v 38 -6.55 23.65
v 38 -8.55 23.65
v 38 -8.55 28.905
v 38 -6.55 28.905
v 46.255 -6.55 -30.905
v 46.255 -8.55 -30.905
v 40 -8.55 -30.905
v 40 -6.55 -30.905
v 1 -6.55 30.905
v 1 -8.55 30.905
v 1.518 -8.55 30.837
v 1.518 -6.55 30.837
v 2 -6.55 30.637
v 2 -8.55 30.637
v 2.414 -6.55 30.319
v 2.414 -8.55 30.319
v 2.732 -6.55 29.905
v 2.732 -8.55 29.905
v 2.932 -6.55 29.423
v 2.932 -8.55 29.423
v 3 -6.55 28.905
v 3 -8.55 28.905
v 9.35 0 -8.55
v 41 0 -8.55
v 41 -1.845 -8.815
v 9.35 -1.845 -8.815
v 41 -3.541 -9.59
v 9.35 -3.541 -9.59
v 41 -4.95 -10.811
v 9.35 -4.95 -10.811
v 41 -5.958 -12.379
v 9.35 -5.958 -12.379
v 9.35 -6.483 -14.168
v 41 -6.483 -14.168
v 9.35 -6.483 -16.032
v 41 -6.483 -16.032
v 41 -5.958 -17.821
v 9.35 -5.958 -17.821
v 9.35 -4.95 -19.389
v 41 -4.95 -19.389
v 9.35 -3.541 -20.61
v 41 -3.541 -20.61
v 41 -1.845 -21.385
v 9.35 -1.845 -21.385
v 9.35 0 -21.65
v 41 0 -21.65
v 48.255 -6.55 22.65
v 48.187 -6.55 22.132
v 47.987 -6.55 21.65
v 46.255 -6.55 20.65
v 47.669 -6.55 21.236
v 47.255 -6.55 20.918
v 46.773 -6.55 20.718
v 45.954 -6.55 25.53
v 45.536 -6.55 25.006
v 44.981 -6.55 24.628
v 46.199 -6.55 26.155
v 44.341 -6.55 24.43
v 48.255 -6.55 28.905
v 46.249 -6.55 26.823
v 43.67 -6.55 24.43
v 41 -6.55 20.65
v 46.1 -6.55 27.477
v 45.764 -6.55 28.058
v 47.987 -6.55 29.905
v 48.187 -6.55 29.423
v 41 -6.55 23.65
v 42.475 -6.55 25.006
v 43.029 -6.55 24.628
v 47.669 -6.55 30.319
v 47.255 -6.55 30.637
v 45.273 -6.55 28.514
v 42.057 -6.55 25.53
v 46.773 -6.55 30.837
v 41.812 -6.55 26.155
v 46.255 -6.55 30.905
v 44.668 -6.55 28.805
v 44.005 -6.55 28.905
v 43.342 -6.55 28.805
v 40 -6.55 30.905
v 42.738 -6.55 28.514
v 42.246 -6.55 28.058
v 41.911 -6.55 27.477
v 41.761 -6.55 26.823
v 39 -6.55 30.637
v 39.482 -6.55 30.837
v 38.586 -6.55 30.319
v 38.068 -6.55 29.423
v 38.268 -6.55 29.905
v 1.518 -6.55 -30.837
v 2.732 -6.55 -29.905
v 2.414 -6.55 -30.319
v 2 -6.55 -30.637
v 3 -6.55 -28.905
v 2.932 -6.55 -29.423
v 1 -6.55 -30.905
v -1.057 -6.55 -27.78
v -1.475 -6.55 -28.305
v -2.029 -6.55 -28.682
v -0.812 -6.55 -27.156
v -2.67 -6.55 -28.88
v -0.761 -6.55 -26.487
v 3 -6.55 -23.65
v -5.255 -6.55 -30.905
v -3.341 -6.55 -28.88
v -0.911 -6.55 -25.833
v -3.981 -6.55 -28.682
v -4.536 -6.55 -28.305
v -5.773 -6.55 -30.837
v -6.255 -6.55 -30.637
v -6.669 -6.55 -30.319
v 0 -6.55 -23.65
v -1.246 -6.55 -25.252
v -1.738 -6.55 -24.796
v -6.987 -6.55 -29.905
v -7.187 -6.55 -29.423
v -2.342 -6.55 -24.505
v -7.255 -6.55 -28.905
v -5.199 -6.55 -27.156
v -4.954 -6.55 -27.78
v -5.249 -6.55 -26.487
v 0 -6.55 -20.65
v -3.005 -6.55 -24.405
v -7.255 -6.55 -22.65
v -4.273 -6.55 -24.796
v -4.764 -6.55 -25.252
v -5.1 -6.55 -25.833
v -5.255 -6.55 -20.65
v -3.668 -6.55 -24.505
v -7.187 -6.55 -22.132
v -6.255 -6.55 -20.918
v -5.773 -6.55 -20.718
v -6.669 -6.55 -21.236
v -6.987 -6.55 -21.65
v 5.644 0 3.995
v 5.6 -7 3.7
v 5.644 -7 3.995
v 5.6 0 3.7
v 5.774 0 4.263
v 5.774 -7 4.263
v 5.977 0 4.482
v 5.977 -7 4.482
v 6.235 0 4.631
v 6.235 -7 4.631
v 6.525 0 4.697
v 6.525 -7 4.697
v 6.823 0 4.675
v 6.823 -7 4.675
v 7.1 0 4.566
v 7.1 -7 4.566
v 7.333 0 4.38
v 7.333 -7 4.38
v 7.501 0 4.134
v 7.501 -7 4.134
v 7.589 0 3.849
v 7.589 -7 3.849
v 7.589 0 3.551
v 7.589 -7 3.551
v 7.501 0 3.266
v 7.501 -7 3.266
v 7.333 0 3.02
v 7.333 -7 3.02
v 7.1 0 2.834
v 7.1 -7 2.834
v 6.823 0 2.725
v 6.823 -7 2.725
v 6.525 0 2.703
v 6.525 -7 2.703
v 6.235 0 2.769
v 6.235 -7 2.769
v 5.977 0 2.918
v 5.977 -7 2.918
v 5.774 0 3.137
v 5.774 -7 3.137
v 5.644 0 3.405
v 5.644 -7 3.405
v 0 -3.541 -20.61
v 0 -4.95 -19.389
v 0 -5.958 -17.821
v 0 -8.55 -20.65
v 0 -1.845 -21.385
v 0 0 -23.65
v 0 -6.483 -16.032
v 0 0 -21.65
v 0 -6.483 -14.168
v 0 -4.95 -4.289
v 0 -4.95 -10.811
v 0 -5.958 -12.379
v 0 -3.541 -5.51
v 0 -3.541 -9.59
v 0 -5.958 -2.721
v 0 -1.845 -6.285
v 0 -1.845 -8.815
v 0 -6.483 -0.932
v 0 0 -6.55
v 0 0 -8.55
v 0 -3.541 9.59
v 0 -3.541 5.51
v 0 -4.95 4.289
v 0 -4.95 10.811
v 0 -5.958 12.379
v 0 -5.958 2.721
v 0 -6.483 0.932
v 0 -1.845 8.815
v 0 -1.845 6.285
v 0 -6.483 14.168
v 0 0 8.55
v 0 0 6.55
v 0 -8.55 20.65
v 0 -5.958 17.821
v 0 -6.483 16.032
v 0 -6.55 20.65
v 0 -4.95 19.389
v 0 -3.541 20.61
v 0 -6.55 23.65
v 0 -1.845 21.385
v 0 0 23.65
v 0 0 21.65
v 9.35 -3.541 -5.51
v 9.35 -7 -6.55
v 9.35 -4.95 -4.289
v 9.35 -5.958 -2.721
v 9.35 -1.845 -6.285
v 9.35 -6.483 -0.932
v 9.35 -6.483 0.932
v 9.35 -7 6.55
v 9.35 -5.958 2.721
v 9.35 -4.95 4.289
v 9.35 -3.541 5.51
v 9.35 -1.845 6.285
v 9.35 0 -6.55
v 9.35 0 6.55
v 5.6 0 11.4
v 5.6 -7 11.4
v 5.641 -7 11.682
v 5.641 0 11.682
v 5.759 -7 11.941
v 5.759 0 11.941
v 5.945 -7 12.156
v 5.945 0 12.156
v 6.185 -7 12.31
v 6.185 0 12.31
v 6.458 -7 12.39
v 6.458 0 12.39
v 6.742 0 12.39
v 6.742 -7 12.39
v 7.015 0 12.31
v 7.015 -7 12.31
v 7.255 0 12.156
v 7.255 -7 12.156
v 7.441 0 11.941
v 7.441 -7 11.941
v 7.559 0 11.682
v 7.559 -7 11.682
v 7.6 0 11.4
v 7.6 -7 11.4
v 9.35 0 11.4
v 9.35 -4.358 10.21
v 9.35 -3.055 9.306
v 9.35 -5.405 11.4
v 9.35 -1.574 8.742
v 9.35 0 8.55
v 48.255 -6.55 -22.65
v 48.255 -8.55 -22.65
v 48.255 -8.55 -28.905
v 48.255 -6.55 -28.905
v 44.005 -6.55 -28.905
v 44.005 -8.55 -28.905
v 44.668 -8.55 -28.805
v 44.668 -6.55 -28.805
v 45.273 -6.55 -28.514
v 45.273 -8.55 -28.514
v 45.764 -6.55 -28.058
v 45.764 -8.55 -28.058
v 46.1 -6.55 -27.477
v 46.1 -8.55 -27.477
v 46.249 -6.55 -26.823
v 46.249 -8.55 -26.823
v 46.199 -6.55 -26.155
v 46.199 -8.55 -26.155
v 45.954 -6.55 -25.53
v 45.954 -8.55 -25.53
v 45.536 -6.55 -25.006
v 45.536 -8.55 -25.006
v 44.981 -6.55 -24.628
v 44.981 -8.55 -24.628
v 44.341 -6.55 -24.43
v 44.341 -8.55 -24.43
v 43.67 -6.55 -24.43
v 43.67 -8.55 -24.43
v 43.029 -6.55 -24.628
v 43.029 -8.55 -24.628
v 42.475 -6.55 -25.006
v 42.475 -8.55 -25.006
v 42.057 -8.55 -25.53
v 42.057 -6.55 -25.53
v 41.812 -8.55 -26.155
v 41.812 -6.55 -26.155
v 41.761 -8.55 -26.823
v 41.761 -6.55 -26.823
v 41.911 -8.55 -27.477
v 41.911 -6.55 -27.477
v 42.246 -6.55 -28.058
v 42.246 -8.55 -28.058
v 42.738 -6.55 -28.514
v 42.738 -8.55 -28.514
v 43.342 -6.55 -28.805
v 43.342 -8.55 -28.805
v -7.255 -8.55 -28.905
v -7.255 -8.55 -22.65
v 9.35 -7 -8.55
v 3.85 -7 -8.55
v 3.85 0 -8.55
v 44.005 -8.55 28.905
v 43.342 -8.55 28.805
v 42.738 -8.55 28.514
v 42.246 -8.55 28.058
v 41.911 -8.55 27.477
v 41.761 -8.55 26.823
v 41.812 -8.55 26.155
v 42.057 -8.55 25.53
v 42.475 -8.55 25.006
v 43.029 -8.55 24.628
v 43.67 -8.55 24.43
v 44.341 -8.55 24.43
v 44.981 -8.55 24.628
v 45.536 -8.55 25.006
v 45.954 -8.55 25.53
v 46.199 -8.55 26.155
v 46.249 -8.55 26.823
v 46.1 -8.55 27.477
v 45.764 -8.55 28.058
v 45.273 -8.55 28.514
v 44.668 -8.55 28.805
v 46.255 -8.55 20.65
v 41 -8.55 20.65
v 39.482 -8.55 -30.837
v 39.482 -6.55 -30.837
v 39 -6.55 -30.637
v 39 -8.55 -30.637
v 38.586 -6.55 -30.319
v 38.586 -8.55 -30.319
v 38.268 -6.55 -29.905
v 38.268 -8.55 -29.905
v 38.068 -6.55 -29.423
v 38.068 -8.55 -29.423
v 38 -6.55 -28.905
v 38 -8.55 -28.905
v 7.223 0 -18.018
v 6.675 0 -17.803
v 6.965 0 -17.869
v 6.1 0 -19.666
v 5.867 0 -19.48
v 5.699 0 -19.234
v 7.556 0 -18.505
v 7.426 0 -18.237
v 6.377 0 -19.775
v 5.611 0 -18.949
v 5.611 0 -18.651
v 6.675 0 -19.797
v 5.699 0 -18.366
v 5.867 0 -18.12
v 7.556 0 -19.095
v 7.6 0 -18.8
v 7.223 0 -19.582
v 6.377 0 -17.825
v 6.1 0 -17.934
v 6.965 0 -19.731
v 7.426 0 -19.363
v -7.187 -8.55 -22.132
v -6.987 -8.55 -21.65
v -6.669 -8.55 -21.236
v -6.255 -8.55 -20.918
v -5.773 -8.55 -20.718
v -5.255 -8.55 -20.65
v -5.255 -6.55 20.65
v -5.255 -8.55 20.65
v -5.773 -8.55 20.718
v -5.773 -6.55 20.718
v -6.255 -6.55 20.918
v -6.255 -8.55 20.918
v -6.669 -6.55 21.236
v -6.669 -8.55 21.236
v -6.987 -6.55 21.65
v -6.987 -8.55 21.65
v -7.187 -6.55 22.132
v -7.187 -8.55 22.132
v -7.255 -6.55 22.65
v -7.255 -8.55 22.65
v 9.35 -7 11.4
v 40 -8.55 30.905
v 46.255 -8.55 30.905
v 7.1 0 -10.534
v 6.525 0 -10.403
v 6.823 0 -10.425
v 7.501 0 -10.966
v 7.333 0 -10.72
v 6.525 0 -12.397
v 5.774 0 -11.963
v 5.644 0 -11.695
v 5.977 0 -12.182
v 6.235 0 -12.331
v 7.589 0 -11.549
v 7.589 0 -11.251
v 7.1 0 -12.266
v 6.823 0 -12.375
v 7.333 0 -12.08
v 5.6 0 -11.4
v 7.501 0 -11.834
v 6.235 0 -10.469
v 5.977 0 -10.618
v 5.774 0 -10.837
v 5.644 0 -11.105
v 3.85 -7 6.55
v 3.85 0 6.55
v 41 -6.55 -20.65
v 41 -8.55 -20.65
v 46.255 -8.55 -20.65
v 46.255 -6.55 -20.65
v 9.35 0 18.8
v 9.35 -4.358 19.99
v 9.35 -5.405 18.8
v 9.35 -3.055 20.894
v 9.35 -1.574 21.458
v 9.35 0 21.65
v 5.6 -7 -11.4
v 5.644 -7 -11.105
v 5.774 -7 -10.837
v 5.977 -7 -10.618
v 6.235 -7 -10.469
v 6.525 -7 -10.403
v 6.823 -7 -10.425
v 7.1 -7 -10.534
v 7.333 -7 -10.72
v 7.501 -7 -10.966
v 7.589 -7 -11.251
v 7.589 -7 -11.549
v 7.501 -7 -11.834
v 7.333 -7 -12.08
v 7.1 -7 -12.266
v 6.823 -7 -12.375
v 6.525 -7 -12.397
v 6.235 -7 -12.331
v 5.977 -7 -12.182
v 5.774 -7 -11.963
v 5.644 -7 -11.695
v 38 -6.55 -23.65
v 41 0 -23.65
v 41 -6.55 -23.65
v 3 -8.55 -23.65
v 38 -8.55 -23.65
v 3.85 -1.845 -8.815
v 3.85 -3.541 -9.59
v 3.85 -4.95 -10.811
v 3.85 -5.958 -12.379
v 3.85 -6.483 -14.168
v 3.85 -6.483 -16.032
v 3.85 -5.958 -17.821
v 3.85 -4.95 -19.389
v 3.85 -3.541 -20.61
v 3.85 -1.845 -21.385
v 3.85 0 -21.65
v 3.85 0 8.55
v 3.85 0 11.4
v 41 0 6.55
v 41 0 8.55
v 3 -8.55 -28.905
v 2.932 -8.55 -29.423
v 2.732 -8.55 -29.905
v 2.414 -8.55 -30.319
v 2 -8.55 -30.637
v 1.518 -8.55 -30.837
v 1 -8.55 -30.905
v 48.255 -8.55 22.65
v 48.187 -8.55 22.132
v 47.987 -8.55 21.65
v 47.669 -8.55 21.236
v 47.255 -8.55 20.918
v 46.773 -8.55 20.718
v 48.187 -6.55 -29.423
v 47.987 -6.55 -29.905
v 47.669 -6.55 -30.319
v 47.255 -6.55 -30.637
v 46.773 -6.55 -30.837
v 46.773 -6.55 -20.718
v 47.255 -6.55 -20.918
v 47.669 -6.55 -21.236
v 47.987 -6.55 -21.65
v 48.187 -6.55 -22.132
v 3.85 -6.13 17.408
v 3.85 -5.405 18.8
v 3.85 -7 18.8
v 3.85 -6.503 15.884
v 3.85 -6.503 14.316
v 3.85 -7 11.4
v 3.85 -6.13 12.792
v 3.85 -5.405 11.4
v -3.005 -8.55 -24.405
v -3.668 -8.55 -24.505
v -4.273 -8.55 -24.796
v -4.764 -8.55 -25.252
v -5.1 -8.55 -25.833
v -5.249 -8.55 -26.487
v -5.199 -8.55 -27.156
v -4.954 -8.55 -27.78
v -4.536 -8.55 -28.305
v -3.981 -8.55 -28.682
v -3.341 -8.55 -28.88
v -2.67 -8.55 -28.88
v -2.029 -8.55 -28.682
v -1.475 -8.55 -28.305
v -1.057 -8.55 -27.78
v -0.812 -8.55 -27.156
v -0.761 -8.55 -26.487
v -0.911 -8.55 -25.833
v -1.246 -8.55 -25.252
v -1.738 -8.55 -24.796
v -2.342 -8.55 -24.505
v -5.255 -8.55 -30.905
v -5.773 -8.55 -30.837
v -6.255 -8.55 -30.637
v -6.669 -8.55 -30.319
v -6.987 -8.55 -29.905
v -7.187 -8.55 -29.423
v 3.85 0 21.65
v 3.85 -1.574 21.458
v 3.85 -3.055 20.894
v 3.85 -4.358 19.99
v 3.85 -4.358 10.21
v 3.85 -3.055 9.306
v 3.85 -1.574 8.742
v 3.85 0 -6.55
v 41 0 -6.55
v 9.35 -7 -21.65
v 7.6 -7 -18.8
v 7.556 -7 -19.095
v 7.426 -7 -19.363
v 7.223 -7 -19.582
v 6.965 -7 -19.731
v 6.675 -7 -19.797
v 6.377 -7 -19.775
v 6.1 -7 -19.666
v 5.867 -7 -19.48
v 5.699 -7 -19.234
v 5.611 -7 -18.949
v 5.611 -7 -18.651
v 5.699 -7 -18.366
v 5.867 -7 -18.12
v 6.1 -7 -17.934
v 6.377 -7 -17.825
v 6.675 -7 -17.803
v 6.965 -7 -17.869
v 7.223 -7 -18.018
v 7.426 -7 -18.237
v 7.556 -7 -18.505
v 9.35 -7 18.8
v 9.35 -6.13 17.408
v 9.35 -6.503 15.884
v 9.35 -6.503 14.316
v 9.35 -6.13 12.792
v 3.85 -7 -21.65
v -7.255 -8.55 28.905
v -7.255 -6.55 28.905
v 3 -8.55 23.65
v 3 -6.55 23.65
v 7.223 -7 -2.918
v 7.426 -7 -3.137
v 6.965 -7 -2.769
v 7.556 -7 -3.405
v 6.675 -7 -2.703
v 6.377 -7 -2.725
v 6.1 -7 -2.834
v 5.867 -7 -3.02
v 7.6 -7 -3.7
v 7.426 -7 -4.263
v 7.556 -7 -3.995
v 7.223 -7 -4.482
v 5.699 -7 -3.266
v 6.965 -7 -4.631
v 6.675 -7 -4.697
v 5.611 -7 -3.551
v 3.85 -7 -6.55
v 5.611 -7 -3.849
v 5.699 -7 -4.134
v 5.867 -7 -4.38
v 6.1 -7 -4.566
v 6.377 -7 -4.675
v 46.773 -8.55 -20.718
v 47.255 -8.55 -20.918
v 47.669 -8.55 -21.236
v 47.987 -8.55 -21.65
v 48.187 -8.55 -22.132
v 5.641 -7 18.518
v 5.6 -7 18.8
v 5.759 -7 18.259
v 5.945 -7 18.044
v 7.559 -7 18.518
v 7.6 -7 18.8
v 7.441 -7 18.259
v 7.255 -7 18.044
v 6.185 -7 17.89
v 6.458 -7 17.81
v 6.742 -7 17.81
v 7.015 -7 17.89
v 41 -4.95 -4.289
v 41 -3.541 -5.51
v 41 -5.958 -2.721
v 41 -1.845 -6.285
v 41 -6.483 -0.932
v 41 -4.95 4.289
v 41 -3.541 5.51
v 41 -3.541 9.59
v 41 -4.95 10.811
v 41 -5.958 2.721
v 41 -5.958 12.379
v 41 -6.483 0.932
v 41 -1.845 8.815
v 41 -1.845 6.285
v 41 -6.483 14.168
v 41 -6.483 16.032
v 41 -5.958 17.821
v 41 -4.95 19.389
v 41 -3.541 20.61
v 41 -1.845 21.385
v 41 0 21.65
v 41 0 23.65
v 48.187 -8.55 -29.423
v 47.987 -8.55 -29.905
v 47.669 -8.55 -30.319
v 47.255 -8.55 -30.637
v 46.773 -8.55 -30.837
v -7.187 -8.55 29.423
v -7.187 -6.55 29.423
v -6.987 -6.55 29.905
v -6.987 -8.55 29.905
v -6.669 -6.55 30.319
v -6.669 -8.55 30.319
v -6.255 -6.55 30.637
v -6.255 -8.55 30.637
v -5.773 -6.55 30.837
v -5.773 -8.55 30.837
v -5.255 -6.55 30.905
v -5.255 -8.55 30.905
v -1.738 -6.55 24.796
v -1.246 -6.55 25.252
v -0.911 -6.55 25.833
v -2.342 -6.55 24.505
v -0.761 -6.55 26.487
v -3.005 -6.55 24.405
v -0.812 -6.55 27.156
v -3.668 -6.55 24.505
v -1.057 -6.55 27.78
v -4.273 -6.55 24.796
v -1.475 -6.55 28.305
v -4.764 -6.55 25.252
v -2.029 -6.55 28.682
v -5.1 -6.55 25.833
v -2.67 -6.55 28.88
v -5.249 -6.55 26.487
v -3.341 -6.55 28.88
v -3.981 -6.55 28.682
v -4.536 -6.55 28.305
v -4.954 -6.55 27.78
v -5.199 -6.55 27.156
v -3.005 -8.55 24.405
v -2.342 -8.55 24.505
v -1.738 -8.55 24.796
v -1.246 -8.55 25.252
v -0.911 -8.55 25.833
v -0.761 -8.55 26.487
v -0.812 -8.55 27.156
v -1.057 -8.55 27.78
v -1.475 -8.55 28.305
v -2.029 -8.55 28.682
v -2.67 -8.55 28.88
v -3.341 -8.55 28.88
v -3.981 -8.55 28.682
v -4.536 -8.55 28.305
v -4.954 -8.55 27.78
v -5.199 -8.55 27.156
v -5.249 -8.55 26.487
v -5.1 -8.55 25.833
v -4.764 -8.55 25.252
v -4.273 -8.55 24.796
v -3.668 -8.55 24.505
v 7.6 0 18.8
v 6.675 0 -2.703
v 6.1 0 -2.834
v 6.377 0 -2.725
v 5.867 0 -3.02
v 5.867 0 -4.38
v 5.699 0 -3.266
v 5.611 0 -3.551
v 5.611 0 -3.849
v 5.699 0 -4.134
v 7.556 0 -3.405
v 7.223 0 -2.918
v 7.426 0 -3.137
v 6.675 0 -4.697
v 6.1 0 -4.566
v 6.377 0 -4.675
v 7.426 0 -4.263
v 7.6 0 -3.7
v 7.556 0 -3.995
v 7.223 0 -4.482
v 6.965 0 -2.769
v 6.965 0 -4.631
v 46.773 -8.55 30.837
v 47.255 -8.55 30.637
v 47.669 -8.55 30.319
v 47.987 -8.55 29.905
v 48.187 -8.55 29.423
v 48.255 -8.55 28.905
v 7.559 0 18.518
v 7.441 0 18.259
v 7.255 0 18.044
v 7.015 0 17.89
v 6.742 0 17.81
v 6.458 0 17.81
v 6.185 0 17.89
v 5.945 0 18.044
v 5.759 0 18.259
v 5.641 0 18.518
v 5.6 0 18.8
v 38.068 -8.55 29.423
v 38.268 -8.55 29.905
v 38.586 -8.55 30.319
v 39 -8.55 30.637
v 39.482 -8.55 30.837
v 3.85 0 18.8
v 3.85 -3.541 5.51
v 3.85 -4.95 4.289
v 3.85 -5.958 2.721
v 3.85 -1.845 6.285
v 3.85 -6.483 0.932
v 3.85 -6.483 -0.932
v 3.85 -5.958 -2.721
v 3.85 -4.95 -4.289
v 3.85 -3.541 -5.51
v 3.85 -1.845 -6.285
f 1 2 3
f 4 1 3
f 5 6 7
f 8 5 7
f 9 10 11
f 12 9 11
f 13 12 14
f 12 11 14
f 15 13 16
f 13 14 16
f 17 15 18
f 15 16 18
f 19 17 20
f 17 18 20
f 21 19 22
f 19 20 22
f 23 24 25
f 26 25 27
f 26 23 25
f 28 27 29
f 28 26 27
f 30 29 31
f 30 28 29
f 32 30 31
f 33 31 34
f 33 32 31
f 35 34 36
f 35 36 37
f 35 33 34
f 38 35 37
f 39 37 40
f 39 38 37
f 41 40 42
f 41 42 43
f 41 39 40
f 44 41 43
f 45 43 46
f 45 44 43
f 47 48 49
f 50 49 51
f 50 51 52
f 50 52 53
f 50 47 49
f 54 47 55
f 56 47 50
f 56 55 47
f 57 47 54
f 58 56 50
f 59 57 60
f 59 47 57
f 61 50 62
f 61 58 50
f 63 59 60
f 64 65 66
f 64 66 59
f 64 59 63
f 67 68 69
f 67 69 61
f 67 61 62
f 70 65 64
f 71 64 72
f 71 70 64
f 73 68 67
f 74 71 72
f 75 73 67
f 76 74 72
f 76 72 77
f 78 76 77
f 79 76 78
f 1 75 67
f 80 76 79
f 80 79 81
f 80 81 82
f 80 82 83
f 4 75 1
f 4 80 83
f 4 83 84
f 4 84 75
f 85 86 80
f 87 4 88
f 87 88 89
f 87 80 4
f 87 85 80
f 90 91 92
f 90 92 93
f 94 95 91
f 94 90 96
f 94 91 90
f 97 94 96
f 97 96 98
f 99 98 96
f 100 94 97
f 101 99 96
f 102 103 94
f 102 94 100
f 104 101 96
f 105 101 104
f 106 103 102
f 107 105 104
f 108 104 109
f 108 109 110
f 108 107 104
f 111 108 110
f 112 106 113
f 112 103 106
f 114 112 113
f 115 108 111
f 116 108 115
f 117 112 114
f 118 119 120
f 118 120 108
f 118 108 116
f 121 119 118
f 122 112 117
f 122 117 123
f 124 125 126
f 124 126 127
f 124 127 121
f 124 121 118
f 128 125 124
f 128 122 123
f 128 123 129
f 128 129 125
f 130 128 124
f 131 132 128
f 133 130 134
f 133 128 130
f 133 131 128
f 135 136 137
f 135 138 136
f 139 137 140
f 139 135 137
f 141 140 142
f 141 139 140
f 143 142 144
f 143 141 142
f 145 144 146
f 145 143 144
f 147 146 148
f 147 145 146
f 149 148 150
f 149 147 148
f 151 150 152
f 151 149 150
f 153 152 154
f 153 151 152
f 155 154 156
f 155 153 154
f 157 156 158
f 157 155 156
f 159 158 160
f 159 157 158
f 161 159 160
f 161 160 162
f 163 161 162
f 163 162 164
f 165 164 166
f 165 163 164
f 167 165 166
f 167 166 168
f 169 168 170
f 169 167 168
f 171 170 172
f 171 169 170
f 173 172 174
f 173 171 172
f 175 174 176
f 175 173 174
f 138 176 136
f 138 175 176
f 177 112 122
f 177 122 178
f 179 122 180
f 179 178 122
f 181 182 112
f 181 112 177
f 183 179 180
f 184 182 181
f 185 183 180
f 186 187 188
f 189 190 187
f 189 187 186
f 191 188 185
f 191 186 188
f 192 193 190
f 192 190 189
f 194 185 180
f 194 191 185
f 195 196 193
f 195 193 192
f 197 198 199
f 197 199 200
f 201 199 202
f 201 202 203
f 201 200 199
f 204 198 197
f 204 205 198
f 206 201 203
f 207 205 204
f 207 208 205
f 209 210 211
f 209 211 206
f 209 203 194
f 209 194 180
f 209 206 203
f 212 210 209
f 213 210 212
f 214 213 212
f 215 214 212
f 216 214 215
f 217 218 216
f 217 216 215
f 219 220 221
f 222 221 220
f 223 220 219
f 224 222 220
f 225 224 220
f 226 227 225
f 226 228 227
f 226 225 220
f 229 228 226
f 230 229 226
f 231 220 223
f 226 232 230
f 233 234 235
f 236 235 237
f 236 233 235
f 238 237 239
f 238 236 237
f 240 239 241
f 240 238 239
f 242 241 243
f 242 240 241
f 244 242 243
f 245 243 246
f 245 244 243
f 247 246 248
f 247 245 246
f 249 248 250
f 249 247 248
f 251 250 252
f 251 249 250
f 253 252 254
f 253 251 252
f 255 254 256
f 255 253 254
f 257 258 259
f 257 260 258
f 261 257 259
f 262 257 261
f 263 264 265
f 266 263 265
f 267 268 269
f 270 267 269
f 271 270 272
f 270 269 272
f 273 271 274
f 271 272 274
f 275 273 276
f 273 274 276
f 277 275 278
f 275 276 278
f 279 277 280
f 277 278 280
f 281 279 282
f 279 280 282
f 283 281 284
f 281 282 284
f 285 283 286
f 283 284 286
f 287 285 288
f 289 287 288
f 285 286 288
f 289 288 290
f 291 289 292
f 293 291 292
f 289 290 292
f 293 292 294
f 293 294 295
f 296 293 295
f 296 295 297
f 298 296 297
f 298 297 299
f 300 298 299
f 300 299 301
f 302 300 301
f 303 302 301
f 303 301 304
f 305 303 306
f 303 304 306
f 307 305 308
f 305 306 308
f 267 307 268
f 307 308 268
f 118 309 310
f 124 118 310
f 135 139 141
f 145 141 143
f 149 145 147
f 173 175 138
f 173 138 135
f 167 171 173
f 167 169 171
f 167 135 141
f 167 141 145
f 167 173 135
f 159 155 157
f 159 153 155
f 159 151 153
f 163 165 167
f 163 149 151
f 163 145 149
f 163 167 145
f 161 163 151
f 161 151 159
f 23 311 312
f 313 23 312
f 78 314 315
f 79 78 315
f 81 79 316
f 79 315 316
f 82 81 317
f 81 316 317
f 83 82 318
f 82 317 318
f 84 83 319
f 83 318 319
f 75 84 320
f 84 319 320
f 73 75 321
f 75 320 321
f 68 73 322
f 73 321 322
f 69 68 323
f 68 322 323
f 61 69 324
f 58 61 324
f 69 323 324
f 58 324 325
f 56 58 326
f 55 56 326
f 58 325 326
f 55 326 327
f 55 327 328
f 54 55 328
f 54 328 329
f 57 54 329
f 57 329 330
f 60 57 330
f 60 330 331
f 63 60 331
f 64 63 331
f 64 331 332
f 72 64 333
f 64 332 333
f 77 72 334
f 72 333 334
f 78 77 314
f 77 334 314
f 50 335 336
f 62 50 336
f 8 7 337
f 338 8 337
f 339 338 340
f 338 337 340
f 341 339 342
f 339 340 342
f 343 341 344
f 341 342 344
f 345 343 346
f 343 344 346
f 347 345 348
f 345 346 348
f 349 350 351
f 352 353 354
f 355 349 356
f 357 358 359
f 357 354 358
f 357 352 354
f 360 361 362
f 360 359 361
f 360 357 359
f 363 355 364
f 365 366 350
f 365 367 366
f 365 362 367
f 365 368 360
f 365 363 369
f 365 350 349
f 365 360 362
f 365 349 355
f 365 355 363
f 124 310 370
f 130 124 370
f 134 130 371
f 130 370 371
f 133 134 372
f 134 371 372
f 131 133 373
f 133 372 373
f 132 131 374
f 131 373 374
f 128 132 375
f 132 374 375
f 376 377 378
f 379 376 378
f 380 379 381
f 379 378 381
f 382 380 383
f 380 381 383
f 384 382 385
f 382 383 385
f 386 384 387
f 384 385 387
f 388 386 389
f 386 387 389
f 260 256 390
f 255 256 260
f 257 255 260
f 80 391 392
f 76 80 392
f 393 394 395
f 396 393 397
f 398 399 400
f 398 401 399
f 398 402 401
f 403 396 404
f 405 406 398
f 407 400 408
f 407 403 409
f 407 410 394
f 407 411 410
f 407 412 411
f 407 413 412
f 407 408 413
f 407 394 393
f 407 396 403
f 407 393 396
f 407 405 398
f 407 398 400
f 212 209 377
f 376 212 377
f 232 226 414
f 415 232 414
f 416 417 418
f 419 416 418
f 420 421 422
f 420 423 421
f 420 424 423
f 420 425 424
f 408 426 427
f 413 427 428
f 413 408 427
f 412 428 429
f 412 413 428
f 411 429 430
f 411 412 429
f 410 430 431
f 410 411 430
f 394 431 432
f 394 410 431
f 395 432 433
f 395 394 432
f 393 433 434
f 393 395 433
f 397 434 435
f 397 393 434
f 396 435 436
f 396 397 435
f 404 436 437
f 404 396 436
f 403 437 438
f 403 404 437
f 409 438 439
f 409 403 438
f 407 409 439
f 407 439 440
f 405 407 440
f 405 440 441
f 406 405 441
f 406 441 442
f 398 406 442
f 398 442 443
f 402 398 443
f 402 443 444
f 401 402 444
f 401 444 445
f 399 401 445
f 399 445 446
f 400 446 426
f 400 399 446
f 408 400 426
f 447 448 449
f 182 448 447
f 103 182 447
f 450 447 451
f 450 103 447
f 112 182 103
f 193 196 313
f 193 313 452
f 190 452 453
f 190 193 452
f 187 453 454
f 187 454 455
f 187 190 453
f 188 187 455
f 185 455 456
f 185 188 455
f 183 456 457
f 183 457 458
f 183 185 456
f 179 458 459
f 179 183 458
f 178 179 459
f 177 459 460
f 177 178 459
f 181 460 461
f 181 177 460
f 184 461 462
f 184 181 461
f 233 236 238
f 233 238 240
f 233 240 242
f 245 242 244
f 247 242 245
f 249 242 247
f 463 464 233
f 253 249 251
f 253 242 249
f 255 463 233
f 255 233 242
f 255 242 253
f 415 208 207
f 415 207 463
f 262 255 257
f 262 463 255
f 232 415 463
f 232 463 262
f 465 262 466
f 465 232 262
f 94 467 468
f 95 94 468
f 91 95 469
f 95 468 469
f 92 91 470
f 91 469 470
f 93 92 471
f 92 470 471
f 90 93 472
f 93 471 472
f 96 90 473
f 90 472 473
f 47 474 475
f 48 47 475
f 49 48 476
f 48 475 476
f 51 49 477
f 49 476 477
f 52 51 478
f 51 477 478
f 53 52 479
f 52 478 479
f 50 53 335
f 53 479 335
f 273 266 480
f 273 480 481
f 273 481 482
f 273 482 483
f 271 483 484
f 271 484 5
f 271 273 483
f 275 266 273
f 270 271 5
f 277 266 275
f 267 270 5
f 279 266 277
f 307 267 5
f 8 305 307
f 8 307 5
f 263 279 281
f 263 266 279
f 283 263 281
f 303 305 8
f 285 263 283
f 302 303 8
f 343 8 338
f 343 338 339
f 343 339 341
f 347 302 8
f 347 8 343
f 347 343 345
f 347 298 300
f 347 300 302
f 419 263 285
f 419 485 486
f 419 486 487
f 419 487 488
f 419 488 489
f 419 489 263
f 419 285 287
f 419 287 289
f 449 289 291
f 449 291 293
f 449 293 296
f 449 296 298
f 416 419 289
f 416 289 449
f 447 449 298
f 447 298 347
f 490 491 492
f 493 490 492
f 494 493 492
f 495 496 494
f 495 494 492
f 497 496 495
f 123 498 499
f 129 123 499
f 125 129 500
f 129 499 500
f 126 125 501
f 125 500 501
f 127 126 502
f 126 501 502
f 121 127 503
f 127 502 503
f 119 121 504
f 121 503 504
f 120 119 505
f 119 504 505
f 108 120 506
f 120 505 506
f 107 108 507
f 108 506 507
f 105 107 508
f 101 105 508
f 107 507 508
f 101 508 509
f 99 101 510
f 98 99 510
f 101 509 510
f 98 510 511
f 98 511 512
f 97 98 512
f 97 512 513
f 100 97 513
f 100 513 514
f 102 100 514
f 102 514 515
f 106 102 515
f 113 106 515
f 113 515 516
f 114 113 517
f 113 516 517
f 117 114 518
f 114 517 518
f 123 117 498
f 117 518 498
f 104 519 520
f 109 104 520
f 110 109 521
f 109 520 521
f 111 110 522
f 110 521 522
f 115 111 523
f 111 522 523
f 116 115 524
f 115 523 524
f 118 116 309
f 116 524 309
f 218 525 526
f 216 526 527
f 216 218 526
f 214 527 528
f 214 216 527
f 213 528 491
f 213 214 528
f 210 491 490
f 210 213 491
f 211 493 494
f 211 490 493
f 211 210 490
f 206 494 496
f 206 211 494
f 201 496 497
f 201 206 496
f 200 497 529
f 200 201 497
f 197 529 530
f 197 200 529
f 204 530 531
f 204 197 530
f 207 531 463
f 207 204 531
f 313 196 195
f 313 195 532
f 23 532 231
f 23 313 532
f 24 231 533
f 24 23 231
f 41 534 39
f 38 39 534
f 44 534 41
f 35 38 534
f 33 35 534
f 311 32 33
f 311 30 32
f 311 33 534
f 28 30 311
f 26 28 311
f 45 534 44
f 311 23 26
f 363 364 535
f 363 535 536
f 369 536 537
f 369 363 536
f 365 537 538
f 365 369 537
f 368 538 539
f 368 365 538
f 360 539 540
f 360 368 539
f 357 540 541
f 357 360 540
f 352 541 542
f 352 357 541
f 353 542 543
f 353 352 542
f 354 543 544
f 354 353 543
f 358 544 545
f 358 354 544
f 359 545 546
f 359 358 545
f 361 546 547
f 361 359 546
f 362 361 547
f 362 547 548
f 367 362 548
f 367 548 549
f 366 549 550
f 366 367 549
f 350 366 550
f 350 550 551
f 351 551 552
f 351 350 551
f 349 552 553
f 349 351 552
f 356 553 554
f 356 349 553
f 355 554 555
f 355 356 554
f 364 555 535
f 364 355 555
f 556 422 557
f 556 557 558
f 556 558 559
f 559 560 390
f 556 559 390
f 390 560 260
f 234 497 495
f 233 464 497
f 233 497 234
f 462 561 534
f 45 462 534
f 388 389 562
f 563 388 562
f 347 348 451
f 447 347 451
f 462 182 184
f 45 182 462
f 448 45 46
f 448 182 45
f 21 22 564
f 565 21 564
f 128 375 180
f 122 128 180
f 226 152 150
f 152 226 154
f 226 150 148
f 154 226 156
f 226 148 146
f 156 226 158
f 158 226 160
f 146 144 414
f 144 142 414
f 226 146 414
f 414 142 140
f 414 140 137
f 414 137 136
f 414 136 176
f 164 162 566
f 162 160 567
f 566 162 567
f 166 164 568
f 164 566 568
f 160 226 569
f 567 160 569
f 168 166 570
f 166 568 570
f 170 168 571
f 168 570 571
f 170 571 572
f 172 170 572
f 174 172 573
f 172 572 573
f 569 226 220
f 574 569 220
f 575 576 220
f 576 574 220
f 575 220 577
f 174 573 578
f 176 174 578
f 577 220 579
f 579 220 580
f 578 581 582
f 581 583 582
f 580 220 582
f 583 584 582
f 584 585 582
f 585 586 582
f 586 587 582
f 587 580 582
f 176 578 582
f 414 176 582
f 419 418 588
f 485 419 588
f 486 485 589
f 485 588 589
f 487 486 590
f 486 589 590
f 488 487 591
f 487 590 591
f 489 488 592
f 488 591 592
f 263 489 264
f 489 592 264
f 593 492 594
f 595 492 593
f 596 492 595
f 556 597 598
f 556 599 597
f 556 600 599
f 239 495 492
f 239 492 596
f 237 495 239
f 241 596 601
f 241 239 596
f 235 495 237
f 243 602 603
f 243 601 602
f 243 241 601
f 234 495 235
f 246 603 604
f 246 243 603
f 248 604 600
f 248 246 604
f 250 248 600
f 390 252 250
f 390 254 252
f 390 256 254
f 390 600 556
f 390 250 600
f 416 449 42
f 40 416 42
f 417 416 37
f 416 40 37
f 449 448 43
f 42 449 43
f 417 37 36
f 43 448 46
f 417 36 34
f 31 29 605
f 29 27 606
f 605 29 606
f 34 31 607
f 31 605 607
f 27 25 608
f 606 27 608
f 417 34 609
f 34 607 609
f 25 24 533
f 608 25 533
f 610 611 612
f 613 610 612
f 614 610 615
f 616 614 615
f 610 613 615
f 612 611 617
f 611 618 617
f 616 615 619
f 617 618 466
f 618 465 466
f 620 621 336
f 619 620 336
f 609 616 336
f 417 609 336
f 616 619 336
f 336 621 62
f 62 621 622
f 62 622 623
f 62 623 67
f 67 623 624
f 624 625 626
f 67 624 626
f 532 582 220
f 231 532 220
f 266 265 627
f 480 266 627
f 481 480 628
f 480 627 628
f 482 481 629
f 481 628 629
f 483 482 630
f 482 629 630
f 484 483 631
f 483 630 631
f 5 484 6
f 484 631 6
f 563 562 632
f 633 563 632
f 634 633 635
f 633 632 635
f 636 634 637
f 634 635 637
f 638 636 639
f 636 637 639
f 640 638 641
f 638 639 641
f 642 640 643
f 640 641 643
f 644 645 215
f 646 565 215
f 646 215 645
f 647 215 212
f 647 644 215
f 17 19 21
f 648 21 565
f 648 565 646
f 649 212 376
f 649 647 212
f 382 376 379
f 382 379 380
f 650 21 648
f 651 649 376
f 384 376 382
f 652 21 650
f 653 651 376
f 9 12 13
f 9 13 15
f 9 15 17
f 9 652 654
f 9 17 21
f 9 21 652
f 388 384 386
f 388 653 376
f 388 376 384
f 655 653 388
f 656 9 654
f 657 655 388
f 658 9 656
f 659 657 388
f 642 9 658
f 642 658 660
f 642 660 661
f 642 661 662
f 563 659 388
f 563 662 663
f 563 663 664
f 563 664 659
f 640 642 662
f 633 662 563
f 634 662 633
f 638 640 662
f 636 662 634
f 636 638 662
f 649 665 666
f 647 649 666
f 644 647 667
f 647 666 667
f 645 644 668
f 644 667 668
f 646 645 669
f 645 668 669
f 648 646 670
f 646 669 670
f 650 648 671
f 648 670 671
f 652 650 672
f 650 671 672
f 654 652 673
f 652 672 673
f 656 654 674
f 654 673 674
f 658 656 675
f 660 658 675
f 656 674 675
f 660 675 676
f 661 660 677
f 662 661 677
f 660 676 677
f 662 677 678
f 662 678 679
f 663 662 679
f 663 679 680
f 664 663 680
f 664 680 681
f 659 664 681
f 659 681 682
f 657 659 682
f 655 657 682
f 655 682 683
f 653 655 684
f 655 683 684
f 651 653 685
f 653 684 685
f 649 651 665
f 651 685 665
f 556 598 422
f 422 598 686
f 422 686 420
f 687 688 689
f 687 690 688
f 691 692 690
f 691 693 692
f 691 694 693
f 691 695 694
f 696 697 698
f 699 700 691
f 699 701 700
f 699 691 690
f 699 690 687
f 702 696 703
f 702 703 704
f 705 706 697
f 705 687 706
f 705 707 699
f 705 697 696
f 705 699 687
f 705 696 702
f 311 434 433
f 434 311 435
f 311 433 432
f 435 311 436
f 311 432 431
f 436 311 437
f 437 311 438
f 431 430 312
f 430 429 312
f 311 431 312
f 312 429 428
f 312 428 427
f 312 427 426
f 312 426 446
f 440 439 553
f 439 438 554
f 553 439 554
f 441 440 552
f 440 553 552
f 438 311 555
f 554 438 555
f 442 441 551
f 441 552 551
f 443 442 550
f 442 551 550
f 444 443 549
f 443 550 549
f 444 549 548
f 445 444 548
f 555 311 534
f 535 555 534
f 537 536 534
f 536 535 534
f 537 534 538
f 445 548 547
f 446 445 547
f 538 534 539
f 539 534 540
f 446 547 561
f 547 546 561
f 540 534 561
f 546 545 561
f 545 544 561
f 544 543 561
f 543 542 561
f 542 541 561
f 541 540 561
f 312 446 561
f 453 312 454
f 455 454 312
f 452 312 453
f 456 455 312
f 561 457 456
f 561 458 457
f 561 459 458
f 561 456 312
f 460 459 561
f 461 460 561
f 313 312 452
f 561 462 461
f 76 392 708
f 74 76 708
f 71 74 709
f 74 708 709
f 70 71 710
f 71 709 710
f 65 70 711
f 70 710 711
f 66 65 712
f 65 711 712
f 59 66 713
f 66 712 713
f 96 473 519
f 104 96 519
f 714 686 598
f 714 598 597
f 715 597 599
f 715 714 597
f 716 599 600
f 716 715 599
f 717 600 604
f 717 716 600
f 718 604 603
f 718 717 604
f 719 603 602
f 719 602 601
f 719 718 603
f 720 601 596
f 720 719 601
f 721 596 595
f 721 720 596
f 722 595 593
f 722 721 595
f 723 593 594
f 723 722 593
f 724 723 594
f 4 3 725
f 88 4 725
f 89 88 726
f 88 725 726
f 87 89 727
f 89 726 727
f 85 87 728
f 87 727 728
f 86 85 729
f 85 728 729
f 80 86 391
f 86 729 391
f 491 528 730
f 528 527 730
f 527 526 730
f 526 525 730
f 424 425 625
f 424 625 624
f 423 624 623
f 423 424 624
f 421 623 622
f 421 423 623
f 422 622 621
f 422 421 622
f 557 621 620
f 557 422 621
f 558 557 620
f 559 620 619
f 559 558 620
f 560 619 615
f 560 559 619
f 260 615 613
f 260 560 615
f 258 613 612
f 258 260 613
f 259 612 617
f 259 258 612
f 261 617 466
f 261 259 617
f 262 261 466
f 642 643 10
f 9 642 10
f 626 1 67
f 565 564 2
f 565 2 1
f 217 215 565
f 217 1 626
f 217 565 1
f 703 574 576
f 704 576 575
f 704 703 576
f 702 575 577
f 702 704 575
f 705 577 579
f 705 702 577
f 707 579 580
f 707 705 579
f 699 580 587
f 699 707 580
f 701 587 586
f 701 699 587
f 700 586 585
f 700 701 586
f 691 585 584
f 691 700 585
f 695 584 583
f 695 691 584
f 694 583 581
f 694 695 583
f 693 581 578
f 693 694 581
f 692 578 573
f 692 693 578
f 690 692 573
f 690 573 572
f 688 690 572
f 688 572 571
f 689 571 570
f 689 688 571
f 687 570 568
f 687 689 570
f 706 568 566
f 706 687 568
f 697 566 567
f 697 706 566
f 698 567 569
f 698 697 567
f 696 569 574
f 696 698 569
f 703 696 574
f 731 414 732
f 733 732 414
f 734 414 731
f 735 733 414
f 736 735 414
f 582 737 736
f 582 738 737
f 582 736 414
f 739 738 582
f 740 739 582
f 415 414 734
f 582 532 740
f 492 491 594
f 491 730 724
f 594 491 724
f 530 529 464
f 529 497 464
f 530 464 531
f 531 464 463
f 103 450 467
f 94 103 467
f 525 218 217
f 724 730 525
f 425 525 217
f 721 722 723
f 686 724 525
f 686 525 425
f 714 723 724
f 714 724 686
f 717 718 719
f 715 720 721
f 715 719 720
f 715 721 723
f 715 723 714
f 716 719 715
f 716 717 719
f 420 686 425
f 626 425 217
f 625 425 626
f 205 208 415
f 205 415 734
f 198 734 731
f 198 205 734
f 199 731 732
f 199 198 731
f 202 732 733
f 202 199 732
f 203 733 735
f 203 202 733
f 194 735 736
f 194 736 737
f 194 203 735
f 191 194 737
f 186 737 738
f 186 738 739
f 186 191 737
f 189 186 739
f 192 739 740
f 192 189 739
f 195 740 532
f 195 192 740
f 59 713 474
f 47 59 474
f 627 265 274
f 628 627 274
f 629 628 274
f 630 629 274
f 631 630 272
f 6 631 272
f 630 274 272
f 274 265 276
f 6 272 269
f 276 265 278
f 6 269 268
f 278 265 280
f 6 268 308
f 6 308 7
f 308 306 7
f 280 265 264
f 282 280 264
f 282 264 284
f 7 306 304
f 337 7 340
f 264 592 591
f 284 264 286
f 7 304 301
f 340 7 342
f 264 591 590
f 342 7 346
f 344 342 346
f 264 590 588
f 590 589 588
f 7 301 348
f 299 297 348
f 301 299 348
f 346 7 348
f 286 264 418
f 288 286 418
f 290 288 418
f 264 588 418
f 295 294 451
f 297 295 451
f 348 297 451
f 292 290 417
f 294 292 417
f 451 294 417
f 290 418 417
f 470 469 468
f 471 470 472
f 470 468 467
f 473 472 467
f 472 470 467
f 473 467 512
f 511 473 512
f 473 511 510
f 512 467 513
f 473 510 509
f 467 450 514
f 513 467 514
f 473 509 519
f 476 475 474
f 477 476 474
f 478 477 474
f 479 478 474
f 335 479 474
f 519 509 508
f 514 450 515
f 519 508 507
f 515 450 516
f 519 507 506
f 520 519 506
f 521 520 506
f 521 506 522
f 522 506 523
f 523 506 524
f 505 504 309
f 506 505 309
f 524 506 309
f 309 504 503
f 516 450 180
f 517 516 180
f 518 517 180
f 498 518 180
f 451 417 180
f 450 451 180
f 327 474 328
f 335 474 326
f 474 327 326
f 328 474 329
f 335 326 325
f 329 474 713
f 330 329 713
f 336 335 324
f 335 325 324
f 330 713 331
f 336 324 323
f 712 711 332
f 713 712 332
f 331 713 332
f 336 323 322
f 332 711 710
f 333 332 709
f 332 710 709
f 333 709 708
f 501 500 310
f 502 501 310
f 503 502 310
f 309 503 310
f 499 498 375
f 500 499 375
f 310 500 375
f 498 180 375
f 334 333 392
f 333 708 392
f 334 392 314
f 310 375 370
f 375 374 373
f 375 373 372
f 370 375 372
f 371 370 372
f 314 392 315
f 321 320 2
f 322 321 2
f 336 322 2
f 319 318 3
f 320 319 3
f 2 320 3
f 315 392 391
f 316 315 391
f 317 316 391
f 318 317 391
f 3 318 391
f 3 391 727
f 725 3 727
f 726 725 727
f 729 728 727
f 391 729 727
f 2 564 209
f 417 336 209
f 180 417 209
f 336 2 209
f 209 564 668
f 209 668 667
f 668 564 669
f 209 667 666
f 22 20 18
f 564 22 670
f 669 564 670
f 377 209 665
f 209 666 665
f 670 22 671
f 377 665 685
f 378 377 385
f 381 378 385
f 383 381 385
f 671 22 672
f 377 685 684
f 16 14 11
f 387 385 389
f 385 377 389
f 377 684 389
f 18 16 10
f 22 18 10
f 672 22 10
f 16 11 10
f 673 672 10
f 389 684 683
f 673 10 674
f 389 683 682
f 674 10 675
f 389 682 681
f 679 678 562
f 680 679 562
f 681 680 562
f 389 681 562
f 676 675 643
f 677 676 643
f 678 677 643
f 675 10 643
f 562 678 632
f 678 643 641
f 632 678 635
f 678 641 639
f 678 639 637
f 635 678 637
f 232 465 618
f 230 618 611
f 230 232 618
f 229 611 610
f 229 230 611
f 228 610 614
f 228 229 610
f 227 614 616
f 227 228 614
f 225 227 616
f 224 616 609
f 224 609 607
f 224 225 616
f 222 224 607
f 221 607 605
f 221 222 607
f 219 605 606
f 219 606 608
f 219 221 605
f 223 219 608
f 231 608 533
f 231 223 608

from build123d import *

# Parameters (mm, degrees)
BOSS_EXTRUDE1_DEPTH = 41
BOSS_EXTRUDE2_REACH = 50.098
SKETCH2_R           = 1
SKETCH4_W           = 5.5
SKETCH4_H           = 13.1
SKETCH4_R           = 1
CUT_EXTRUDE1_DEPTH  = 7
SKETCH5_R           = 2.25
BOSS_EXTRUDE3_DEPTH = 2
BOSS_EXTRUDE4_REACH = 59.938
SKETCH6_W           = 5.5
SKETCH6_H           = 2.85
CUT_EXTRUDE2_DEPTH  = 7


with BuildPart() as part:
    # Sketch1 → Boss-Extrude1 (new body)
    with BuildSketch(Plane(origin=(0, 0, 0), x_dir=(0, 0, -1), z_dir=(1, 0, 0))):
        with BuildLine():
            Line((-8.55, 0), (-6.55, 0))
            ThreePointArc((-6.55, 0), (0, -6.55), (6.55, 0))
            Line((6.55, 0), (8.55, 0))
            ThreePointArc((8.55, 0), (15.1, -6.55), (21.65, 0))
            Line((21.65, 0), (23.65, 0))
            Line((23.65, 0), (23.65, -8.55))
            Line((23.65, -8.55), (-23.65, -8.55))
            Line((-23.65, -8.55), (-23.65, 0))
            Line((-23.65, 0), (-21.65, 0))
            ThreePointArc((-21.65, 0), (-15.1, -6.55), (-8.55, 0))
        make_face()
    extrude(amount=BOSS_EXTRUDE1_DEPTH)

    # Sketch2 → Boss-Extrude2 (add, up to next)
    with BuildSketch(Plane(origin=(0, 0, 0), x_dir=(1, 0, 0), z_dir=(0, 1, 0)), mode=Mode.PRIVATE) as boss_extrude2_sk1:
        with Locations(Location((6.6, 3.7, 0), (0, 0, 270))):
            Circle(SKETCH2_R)
    boss_extrude2_tool1 = extrude(boss_extrude2_sk1.sketch, amount=-BOSS_EXTRUDE2_REACH, mode=Mode.PRIVATE) - part.part
    # Sketch2 → Boss-Extrude2 (add, up to next)
    with BuildSketch(Plane(origin=(0, 0, 0), x_dir=(1, 0, 0), z_dir=(0, 1, 0)), mode=Mode.PRIVATE) as boss_extrude2_sk2:
        with Locations(Location((6.6, -3.7, 0), (0, 0, 270))):
            Circle(SKETCH2_R)
    boss_extrude2_tool2 = extrude(boss_extrude2_sk2.sketch, amount=-BOSS_EXTRUDE2_REACH, mode=Mode.PRIVATE) - part.part
    # Sketch2 → Boss-Extrude2 (add, up to next)
    with BuildSketch(Plane(origin=(0, 0, 0), x_dir=(1, 0, 0), z_dir=(0, 1, 0)), mode=Mode.PRIVATE) as boss_extrude2_sk3:
        with Locations(Location((6.6, -11.4, 0), (0, 0, 270))):
            Circle(SKETCH2_R)
    boss_extrude2_tool3 = extrude(boss_extrude2_sk3.sketch, amount=-BOSS_EXTRUDE2_REACH, mode=Mode.PRIVATE) - part.part
    # Sketch2 → Boss-Extrude2 (add, up to next)
    with BuildSketch(Plane(origin=(0, 0, 0), x_dir=(1, 0, 0), z_dir=(0, 1, 0)), mode=Mode.PRIVATE) as boss_extrude2_sk4:
        with Locations(Location((6.6, -18.8, 0), (0, 0, 270))):
            Circle(SKETCH2_R)
    boss_extrude2_tool4 = extrude(boss_extrude2_sk4.sketch, amount=-BOSS_EXTRUDE2_REACH, mode=Mode.PRIVATE) - part.part
    # Sketch2 → Boss-Extrude2 (add, up to next)
    with BuildSketch(Plane(origin=(0, 0, 0), x_dir=(1, 0, 0), z_dir=(0, 1, 0)), mode=Mode.PRIVATE) as boss_extrude2_sk5:
        with Locations(Location((6.6, 18.8, 0), (0, 0, 270))):
            Circle(SKETCH2_R)
    boss_extrude2_tool5 = extrude(boss_extrude2_sk5.sketch, amount=-BOSS_EXTRUDE2_REACH, mode=Mode.PRIVATE) - part.part
    # Sketch2 → Boss-Extrude2 (add, up to next)
    with BuildSketch(Plane(origin=(0, 0, 0), x_dir=(1, 0, 0), z_dir=(0, 1, 0)), mode=Mode.PRIVATE) as boss_extrude2_sk6:
        with Locations(Location((6.6, 11.4, 0), (0, 0, 270))):
            Circle(SKETCH2_R)
    boss_extrude2_tool6 = extrude(boss_extrude2_sk6.sketch, amount=-BOSS_EXTRUDE2_REACH, mode=Mode.PRIVATE) - part.part
    add(boss_extrude2_tool1.solids().sort_by_distance((6.6, 0, -3.7))[0])
    add(boss_extrude2_tool2.solids().sort_by_distance((6.6, 0, 3.7))[0])
    add(boss_extrude2_tool3.solids().sort_by_distance((6.6, 0, 11.4))[0])
    add(boss_extrude2_tool4.solids().sort_by_distance((6.6, 0, 18.8))[0])
    add(boss_extrude2_tool5.solids().sort_by_distance((6.6, 0, -18.8))[0])
    add(boss_extrude2_tool6.solids().sort_by_distance((6.6, 0, -11.4))[0])

    # Sketch4 → Cut-Extrude1 (cut)
    # profile 1 of 3: a face of its own
    with BuildSketch(Plane(origin=(0, 0, 0), x_dir=(1, 0, 0), z_dir=(0, 1, 0))):
        with Locations((6.6, 0)):
            Rectangle(SKETCH4_W, SKETCH4_H)
        with Locations(Location((6.6, 3.7, 0), (0, 0, 270))):
            Circle(SKETCH4_R, mode=Mode.SUBTRACT)
        with Locations(Location((6.6, -3.7, 0), (0, 0, 270))):
            Circle(SKETCH4_R, mode=Mode.SUBTRACT)
    # profile 2 of 3: a face of its own
    with BuildSketch(Plane(origin=(0, 0, 0), x_dir=(1, 0, 0), z_dir=(0, 1, 0))):
        with Locations((6.6, -15.1)):
            Rectangle(SKETCH4_W, SKETCH4_H)
        with Locations(Location((6.6, -11.4, 0), (0, 0, 90))):
            Circle(SKETCH4_R, mode=Mode.SUBTRACT)
        with Locations(Location((6.6, -18.8, 0), (0, 0, 90))):
            Circle(SKETCH4_R, mode=Mode.SUBTRACT)
    # profile 3 of 3: a face of its own
    with BuildSketch(Plane(origin=(0, 0, 0), x_dir=(1, 0, 0), z_dir=(0, 1, 0))):
        with Locations((6.6, 15.1)):
            Rectangle(SKETCH4_W, SKETCH4_H)
        with Locations(Location((6.6, 11.4, 0), (0, 0, 90))):
            Circle(SKETCH4_R, mode=Mode.SUBTRACT)
        with Locations(Location((6.6, 18.8, 0), (0, 0, 90))):
            Circle(SKETCH4_R, mode=Mode.SUBTRACT)
    extrude(amount=-CUT_EXTRUDE1_DEPTH, mode=Mode.SUBTRACT)

    # Sketch5 → Boss-Extrude3 (add)
    # profile 1 of 4: a face of its own
    with BuildSketch(Plane.XZ.offset(8.55)):
        with BuildLine():
            Line((0, 23.65), (0, 20.65))
            Line((0, 20.65), (-5.25520382, 20.65))
            ThreePointArc((-5.25520382, 20.65), (-6.669417382, 21.235786438), (-7.25520382, 22.65))
            Line((-7.25520382, 22.65), (-7.25520382, 28.90520382))
            ThreePointArc((-7.25520382, 28.90520382), (-6.669417382, 30.319417382), (-5.25520382, 30.90520382))
            Line((-5.25520382, 30.90520382), (1, 30.90520382))
            ThreePointArc((1, 30.90520382), (2.414213562, 30.319417382), (3, 28.90520382))
            Line((3, 28.90520382), (3, 23.65))
            Line((3, 23.65), (0, 23.65))
        make_face()
        with Locations(Location((-3.00520382, 26.65520382, 0), (0, 0, 270))):
            Circle(SKETCH5_R, mode=Mode.SUBTRACT)
    # profile 2 of 4: a face of its own
    with BuildSketch(Plane.XZ.offset(8.55)):
        with BuildLine():
            Line((0, -23.65), (3, -23.65))
            Line((3, -23.65), (3, -28.90520382))
            ThreePointArc((3, -28.90520382), (2.414213562, -30.319417382), (1, -30.90520382))
            Line((1, -30.90520382), (-5.25520382, -30.90520382))
            ThreePointArc((-5.25520382, -30.90520382), (-6.669417382, -30.319417382), (-7.25520382, -28.90520382))
            Line((-7.25520382, -28.90520382), (-7.25520382, -22.65))
            ThreePointArc((-7.25520382, -22.65), (-6.669417382, -21.235786438), (-5.25520382, -20.65))
            Line((-5.25520382, -20.65), (0, -20.65))
            Line((0, -20.65), (0, -23.65))
        make_face()
        with Locations(Location((-3.00520382, -26.65520382, 0), (0, 0, 90))):
            Circle(SKETCH5_R, mode=Mode.SUBTRACT)
    # profile 3 of 4: a face of its own
    with BuildSketch(Plane.XZ.offset(8.55)):
        with BuildLine():
            Line((41, -23.65), (41, -20.65))
            Line((41, -20.65), (46.25520382, -20.65))
            ThreePointArc((46.25520382, -20.65), (47.669417382, -21.235786438), (48.25520382, -22.65))
            Line((48.25520382, -22.65), (48.25520382, -28.90520382))
            ThreePointArc((48.25520382, -28.90520382), (47.669417382, -30.319417382), (46.25520382, -30.90520382))
            Line((46.25520382, -30.90520382), (40, -30.90520382))
            ThreePointArc((40, -30.90520382), (38.585786438, -30.319417382), (38, -28.90520382))
            Line((38, -28.90520382), (38, -23.65))
            Line((38, -23.65), (41, -23.65))
        make_face()
        with Locations(Location((44.00520382, -26.65520382, 0), (0, 0, 270))):
            Circle(SKETCH5_R, mode=Mode.SUBTRACT)
    # profile 4 of 4: a face of its own
    with BuildSketch(Plane.XZ.offset(8.55)):
        with BuildLine():
            Line((41, 23.65), (38, 23.65))
            Line((38, 23.65), (38, 28.90520382))
            ThreePointArc((38, 28.90520382), (38.585786438, 30.319417382), (40, 30.90520382))
            Line((40, 30.90520382), (46.25520382, 30.90520382))
            ThreePointArc((46.25520382, 30.90520382), (47.669417382, 30.319417382), (48.25520382, 28.90520382))
            Line((48.25520382, 28.90520382), (48.25520382, 22.65))
            ThreePointArc((48.25520382, 22.65), (47.669417382, 21.235786438), (46.25520382, 20.65))
            Line((46.25520382, 20.65), (41, 20.65))
            Line((41, 20.65), (41, 23.65))
        make_face()
        with Locations(Location((44.00520382, 26.65520382, 0), (0, 0, 90))):
            Circle(SKETCH5_R, mode=Mode.SUBTRACT)
    extrude(amount=-BOSS_EXTRUDE3_DEPTH)

    # Boss-Extrude4: up to this face of the body (flat: up to its plane)
    boss_extrude4_end = Plane(part.part.faces().sort_by_distance((6.6, -7, -15.1))[0])
    # Sketch6 → Boss-Extrude4 (add, up to the picked face)
    with BuildSketch(Plane(origin=(0, 0, 0), x_dir=(1, 0, 0), z_dir=(0, 1, 0)), mode=Mode.PRIVATE) as boss_extrude4_sk1:
        with Locations((6.6, -5.125)):
            Rectangle(SKETCH6_W, SKETCH6_H)
    boss_extrude4_tool1 = split(extrude(boss_extrude4_sk1.sketch, amount=-BOSS_EXTRUDE4_REACH, mode=Mode.PRIVATE), bisect_by=boss_extrude4_end, keep=Keep.BOTH, mode=Mode.PRIVATE)
    # Sketch6 → Boss-Extrude4 (add, up to the picked face)
    with BuildSketch(Plane(origin=(0, 0, 0), x_dir=(1, 0, 0), z_dir=(0, 1, 0)), mode=Mode.PRIVATE) as boss_extrude4_sk2:
        with Locations((6.6, 5.125)):
            Rectangle(SKETCH6_W, SKETCH6_H)
    boss_extrude4_tool2 = split(extrude(boss_extrude4_sk2.sketch, amount=-BOSS_EXTRUDE4_REACH, mode=Mode.PRIVATE), bisect_by=boss_extrude4_end, keep=Keep.BOTH, mode=Mode.PRIVATE)
    # Sketch6 → Boss-Extrude4 (add, up to the picked face)
    with BuildSketch(Plane(origin=(0, 0, 0), x_dir=(1, 0, 0), z_dir=(0, 1, 0)), mode=Mode.PRIVATE) as boss_extrude4_sk3:
        with Locations((6.6, -20.225)):
            Rectangle(SKETCH6_W, SKETCH6_H)
    boss_extrude4_tool3 = split(extrude(boss_extrude4_sk3.sketch, amount=-BOSS_EXTRUDE4_REACH, mode=Mode.PRIVATE), bisect_by=boss_extrude4_end, keep=Keep.BOTH, mode=Mode.PRIVATE)
    # Sketch6 → Boss-Extrude4 (add, up to the picked face)
    with BuildSketch(Plane(origin=(0, 0, 0), x_dir=(1, 0, 0), z_dir=(0, 1, 0)), mode=Mode.PRIVATE) as boss_extrude4_sk4:
        with Locations((6.6, -9.975)):
            Rectangle(SKETCH6_W, SKETCH6_H)
    boss_extrude4_tool4 = split(extrude(boss_extrude4_sk4.sketch, amount=-BOSS_EXTRUDE4_REACH, mode=Mode.PRIVATE), bisect_by=boss_extrude4_end, keep=Keep.BOTH, mode=Mode.PRIVATE)
    # Sketch6 → Boss-Extrude4 (add, up to the picked face)
    with BuildSketch(Plane(origin=(0, 0, 0), x_dir=(1, 0, 0), z_dir=(0, 1, 0)), mode=Mode.PRIVATE) as boss_extrude4_sk5:
        with Locations((6.6, 9.975)):
            Rectangle(SKETCH6_W, SKETCH6_H)
    boss_extrude4_tool5 = split(extrude(boss_extrude4_sk5.sketch, amount=-BOSS_EXTRUDE4_REACH, mode=Mode.PRIVATE), bisect_by=boss_extrude4_end, keep=Keep.BOTH, mode=Mode.PRIVATE)
    # Sketch6 → Boss-Extrude4 (add, up to the picked face)
    with BuildSketch(Plane(origin=(0, 0, 0), x_dir=(1, 0, 0), z_dir=(0, 1, 0)), mode=Mode.PRIVATE) as boss_extrude4_sk6:
        with Locations((6.6, 20.225)):
            Rectangle(SKETCH6_W, SKETCH6_H)
    boss_extrude4_tool6 = split(extrude(boss_extrude4_sk6.sketch, amount=-BOSS_EXTRUDE4_REACH, mode=Mode.PRIVATE), bisect_by=boss_extrude4_end, keep=Keep.BOTH, mode=Mode.PRIVATE)
    add(boss_extrude4_tool1.solids().sort_by(Axis((6.6, 0, 5.125), (0, -1, 0)))[0])
    add(boss_extrude4_tool2.solids().sort_by(Axis((6.6, 0, -5.125), (0, -1, 0)))[0])
    add(boss_extrude4_tool3.solids().sort_by(Axis((6.6, 0, 20.225), (0, -1, 0)))[0])
    add(boss_extrude4_tool4.solids().sort_by(Axis((6.6, 0, 9.975), (0, -1, 0)))[0])
    add(boss_extrude4_tool5.solids().sort_by(Axis((6.6, 0, -9.975), (0, -1, 0)))[0])
    add(boss_extrude4_tool6.solids().sort_by(Axis((6.6, 0, -20.225), (0, -1, 0)))[0])

    # Sketch7 → Cut-Extrude2 (cut)
    with BuildSketch(Plane(origin=(0, 0, 0), x_dir=(1, 0, 0), z_dir=(0, 1, 0))):
        with BuildLine():
            Line((5.6, 3.7), (3.85, 3.7))
            Line((3.85, 3.7), (3.85, 6.55))
            Line((3.85, 6.55), (9.35, 6.55))
            Line((9.35, 6.55), (9.35, 3.7))
            Line((9.35, 3.7), (7.6, 3.7))
            ThreePointArc((7.6, 3.7), (6.6, 4.7), (5.6, 3.7))
        make_face()
        with BuildLine():
            Line((7.6, -3.7), (9.35, -3.7))
            Line((9.35, -3.7), (9.35, -6.55))
            Line((9.35, -6.55), (3.85, -6.55))
            Line((3.85, -6.55), (3.85, -3.7))
            Line((3.85, -3.7), (5.6, -3.7))
            ThreePointArc((5.6, -3.7), (6.6, -4.7), (7.6, -3.7))
        make_face()
        with BuildLine():
            Line((5.6, 18.8), (3.85, 18.8))
            Line((3.85, 18.8), (3.85, 21.65))
            Line((3.85, 21.65), (9.35, 21.65))
            Line((9.35, 21.65), (9.35, 18.8))
            Line((9.35, 18.8), (7.6, 18.8))
            ThreePointArc((7.6, 18.8), (6.6, 19.8), (5.6, 18.8))
        make_face()
        with BuildLine():
            Line((7.6, 11.4), (9.35, 11.4))
            Line((9.35, 11.4), (9.35, 8.55))
            Line((9.35, 8.55), (3.85, 8.55))
            Line((3.85, 8.55), (3.85, 11.4))
            Line((3.85, 11.4), (5.6, 11.4))
            ThreePointArc((5.6, 11.4), (6.6, 10.4), (7.6, 11.4))
        make_face()
    extrude(amount=-CUT_EXTRUDE2_DEPTH, mode=Mode.SUBTRACT)


solid = part.part
